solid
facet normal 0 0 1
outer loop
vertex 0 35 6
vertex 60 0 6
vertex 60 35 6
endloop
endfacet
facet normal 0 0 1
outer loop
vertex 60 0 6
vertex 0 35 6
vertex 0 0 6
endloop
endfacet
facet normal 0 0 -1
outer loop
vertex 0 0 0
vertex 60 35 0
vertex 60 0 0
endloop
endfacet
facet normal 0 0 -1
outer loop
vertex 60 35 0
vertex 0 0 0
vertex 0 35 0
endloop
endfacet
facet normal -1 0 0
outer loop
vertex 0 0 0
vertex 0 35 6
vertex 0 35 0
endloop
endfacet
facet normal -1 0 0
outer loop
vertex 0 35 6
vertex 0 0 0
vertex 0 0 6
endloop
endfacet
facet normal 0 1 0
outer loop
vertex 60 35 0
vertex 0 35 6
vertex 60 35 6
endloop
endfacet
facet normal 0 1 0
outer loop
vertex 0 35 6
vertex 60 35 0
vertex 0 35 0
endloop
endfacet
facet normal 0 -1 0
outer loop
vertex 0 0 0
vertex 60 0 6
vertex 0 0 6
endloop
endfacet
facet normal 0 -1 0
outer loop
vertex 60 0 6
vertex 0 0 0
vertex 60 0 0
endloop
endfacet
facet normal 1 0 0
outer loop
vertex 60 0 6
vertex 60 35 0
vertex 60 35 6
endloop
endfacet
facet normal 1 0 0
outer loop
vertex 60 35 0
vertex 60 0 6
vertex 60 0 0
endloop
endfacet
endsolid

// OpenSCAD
color("gold") cube([10,35,6]);
translate([10,0,0])
    color("silver") cube([50,35,6]);
